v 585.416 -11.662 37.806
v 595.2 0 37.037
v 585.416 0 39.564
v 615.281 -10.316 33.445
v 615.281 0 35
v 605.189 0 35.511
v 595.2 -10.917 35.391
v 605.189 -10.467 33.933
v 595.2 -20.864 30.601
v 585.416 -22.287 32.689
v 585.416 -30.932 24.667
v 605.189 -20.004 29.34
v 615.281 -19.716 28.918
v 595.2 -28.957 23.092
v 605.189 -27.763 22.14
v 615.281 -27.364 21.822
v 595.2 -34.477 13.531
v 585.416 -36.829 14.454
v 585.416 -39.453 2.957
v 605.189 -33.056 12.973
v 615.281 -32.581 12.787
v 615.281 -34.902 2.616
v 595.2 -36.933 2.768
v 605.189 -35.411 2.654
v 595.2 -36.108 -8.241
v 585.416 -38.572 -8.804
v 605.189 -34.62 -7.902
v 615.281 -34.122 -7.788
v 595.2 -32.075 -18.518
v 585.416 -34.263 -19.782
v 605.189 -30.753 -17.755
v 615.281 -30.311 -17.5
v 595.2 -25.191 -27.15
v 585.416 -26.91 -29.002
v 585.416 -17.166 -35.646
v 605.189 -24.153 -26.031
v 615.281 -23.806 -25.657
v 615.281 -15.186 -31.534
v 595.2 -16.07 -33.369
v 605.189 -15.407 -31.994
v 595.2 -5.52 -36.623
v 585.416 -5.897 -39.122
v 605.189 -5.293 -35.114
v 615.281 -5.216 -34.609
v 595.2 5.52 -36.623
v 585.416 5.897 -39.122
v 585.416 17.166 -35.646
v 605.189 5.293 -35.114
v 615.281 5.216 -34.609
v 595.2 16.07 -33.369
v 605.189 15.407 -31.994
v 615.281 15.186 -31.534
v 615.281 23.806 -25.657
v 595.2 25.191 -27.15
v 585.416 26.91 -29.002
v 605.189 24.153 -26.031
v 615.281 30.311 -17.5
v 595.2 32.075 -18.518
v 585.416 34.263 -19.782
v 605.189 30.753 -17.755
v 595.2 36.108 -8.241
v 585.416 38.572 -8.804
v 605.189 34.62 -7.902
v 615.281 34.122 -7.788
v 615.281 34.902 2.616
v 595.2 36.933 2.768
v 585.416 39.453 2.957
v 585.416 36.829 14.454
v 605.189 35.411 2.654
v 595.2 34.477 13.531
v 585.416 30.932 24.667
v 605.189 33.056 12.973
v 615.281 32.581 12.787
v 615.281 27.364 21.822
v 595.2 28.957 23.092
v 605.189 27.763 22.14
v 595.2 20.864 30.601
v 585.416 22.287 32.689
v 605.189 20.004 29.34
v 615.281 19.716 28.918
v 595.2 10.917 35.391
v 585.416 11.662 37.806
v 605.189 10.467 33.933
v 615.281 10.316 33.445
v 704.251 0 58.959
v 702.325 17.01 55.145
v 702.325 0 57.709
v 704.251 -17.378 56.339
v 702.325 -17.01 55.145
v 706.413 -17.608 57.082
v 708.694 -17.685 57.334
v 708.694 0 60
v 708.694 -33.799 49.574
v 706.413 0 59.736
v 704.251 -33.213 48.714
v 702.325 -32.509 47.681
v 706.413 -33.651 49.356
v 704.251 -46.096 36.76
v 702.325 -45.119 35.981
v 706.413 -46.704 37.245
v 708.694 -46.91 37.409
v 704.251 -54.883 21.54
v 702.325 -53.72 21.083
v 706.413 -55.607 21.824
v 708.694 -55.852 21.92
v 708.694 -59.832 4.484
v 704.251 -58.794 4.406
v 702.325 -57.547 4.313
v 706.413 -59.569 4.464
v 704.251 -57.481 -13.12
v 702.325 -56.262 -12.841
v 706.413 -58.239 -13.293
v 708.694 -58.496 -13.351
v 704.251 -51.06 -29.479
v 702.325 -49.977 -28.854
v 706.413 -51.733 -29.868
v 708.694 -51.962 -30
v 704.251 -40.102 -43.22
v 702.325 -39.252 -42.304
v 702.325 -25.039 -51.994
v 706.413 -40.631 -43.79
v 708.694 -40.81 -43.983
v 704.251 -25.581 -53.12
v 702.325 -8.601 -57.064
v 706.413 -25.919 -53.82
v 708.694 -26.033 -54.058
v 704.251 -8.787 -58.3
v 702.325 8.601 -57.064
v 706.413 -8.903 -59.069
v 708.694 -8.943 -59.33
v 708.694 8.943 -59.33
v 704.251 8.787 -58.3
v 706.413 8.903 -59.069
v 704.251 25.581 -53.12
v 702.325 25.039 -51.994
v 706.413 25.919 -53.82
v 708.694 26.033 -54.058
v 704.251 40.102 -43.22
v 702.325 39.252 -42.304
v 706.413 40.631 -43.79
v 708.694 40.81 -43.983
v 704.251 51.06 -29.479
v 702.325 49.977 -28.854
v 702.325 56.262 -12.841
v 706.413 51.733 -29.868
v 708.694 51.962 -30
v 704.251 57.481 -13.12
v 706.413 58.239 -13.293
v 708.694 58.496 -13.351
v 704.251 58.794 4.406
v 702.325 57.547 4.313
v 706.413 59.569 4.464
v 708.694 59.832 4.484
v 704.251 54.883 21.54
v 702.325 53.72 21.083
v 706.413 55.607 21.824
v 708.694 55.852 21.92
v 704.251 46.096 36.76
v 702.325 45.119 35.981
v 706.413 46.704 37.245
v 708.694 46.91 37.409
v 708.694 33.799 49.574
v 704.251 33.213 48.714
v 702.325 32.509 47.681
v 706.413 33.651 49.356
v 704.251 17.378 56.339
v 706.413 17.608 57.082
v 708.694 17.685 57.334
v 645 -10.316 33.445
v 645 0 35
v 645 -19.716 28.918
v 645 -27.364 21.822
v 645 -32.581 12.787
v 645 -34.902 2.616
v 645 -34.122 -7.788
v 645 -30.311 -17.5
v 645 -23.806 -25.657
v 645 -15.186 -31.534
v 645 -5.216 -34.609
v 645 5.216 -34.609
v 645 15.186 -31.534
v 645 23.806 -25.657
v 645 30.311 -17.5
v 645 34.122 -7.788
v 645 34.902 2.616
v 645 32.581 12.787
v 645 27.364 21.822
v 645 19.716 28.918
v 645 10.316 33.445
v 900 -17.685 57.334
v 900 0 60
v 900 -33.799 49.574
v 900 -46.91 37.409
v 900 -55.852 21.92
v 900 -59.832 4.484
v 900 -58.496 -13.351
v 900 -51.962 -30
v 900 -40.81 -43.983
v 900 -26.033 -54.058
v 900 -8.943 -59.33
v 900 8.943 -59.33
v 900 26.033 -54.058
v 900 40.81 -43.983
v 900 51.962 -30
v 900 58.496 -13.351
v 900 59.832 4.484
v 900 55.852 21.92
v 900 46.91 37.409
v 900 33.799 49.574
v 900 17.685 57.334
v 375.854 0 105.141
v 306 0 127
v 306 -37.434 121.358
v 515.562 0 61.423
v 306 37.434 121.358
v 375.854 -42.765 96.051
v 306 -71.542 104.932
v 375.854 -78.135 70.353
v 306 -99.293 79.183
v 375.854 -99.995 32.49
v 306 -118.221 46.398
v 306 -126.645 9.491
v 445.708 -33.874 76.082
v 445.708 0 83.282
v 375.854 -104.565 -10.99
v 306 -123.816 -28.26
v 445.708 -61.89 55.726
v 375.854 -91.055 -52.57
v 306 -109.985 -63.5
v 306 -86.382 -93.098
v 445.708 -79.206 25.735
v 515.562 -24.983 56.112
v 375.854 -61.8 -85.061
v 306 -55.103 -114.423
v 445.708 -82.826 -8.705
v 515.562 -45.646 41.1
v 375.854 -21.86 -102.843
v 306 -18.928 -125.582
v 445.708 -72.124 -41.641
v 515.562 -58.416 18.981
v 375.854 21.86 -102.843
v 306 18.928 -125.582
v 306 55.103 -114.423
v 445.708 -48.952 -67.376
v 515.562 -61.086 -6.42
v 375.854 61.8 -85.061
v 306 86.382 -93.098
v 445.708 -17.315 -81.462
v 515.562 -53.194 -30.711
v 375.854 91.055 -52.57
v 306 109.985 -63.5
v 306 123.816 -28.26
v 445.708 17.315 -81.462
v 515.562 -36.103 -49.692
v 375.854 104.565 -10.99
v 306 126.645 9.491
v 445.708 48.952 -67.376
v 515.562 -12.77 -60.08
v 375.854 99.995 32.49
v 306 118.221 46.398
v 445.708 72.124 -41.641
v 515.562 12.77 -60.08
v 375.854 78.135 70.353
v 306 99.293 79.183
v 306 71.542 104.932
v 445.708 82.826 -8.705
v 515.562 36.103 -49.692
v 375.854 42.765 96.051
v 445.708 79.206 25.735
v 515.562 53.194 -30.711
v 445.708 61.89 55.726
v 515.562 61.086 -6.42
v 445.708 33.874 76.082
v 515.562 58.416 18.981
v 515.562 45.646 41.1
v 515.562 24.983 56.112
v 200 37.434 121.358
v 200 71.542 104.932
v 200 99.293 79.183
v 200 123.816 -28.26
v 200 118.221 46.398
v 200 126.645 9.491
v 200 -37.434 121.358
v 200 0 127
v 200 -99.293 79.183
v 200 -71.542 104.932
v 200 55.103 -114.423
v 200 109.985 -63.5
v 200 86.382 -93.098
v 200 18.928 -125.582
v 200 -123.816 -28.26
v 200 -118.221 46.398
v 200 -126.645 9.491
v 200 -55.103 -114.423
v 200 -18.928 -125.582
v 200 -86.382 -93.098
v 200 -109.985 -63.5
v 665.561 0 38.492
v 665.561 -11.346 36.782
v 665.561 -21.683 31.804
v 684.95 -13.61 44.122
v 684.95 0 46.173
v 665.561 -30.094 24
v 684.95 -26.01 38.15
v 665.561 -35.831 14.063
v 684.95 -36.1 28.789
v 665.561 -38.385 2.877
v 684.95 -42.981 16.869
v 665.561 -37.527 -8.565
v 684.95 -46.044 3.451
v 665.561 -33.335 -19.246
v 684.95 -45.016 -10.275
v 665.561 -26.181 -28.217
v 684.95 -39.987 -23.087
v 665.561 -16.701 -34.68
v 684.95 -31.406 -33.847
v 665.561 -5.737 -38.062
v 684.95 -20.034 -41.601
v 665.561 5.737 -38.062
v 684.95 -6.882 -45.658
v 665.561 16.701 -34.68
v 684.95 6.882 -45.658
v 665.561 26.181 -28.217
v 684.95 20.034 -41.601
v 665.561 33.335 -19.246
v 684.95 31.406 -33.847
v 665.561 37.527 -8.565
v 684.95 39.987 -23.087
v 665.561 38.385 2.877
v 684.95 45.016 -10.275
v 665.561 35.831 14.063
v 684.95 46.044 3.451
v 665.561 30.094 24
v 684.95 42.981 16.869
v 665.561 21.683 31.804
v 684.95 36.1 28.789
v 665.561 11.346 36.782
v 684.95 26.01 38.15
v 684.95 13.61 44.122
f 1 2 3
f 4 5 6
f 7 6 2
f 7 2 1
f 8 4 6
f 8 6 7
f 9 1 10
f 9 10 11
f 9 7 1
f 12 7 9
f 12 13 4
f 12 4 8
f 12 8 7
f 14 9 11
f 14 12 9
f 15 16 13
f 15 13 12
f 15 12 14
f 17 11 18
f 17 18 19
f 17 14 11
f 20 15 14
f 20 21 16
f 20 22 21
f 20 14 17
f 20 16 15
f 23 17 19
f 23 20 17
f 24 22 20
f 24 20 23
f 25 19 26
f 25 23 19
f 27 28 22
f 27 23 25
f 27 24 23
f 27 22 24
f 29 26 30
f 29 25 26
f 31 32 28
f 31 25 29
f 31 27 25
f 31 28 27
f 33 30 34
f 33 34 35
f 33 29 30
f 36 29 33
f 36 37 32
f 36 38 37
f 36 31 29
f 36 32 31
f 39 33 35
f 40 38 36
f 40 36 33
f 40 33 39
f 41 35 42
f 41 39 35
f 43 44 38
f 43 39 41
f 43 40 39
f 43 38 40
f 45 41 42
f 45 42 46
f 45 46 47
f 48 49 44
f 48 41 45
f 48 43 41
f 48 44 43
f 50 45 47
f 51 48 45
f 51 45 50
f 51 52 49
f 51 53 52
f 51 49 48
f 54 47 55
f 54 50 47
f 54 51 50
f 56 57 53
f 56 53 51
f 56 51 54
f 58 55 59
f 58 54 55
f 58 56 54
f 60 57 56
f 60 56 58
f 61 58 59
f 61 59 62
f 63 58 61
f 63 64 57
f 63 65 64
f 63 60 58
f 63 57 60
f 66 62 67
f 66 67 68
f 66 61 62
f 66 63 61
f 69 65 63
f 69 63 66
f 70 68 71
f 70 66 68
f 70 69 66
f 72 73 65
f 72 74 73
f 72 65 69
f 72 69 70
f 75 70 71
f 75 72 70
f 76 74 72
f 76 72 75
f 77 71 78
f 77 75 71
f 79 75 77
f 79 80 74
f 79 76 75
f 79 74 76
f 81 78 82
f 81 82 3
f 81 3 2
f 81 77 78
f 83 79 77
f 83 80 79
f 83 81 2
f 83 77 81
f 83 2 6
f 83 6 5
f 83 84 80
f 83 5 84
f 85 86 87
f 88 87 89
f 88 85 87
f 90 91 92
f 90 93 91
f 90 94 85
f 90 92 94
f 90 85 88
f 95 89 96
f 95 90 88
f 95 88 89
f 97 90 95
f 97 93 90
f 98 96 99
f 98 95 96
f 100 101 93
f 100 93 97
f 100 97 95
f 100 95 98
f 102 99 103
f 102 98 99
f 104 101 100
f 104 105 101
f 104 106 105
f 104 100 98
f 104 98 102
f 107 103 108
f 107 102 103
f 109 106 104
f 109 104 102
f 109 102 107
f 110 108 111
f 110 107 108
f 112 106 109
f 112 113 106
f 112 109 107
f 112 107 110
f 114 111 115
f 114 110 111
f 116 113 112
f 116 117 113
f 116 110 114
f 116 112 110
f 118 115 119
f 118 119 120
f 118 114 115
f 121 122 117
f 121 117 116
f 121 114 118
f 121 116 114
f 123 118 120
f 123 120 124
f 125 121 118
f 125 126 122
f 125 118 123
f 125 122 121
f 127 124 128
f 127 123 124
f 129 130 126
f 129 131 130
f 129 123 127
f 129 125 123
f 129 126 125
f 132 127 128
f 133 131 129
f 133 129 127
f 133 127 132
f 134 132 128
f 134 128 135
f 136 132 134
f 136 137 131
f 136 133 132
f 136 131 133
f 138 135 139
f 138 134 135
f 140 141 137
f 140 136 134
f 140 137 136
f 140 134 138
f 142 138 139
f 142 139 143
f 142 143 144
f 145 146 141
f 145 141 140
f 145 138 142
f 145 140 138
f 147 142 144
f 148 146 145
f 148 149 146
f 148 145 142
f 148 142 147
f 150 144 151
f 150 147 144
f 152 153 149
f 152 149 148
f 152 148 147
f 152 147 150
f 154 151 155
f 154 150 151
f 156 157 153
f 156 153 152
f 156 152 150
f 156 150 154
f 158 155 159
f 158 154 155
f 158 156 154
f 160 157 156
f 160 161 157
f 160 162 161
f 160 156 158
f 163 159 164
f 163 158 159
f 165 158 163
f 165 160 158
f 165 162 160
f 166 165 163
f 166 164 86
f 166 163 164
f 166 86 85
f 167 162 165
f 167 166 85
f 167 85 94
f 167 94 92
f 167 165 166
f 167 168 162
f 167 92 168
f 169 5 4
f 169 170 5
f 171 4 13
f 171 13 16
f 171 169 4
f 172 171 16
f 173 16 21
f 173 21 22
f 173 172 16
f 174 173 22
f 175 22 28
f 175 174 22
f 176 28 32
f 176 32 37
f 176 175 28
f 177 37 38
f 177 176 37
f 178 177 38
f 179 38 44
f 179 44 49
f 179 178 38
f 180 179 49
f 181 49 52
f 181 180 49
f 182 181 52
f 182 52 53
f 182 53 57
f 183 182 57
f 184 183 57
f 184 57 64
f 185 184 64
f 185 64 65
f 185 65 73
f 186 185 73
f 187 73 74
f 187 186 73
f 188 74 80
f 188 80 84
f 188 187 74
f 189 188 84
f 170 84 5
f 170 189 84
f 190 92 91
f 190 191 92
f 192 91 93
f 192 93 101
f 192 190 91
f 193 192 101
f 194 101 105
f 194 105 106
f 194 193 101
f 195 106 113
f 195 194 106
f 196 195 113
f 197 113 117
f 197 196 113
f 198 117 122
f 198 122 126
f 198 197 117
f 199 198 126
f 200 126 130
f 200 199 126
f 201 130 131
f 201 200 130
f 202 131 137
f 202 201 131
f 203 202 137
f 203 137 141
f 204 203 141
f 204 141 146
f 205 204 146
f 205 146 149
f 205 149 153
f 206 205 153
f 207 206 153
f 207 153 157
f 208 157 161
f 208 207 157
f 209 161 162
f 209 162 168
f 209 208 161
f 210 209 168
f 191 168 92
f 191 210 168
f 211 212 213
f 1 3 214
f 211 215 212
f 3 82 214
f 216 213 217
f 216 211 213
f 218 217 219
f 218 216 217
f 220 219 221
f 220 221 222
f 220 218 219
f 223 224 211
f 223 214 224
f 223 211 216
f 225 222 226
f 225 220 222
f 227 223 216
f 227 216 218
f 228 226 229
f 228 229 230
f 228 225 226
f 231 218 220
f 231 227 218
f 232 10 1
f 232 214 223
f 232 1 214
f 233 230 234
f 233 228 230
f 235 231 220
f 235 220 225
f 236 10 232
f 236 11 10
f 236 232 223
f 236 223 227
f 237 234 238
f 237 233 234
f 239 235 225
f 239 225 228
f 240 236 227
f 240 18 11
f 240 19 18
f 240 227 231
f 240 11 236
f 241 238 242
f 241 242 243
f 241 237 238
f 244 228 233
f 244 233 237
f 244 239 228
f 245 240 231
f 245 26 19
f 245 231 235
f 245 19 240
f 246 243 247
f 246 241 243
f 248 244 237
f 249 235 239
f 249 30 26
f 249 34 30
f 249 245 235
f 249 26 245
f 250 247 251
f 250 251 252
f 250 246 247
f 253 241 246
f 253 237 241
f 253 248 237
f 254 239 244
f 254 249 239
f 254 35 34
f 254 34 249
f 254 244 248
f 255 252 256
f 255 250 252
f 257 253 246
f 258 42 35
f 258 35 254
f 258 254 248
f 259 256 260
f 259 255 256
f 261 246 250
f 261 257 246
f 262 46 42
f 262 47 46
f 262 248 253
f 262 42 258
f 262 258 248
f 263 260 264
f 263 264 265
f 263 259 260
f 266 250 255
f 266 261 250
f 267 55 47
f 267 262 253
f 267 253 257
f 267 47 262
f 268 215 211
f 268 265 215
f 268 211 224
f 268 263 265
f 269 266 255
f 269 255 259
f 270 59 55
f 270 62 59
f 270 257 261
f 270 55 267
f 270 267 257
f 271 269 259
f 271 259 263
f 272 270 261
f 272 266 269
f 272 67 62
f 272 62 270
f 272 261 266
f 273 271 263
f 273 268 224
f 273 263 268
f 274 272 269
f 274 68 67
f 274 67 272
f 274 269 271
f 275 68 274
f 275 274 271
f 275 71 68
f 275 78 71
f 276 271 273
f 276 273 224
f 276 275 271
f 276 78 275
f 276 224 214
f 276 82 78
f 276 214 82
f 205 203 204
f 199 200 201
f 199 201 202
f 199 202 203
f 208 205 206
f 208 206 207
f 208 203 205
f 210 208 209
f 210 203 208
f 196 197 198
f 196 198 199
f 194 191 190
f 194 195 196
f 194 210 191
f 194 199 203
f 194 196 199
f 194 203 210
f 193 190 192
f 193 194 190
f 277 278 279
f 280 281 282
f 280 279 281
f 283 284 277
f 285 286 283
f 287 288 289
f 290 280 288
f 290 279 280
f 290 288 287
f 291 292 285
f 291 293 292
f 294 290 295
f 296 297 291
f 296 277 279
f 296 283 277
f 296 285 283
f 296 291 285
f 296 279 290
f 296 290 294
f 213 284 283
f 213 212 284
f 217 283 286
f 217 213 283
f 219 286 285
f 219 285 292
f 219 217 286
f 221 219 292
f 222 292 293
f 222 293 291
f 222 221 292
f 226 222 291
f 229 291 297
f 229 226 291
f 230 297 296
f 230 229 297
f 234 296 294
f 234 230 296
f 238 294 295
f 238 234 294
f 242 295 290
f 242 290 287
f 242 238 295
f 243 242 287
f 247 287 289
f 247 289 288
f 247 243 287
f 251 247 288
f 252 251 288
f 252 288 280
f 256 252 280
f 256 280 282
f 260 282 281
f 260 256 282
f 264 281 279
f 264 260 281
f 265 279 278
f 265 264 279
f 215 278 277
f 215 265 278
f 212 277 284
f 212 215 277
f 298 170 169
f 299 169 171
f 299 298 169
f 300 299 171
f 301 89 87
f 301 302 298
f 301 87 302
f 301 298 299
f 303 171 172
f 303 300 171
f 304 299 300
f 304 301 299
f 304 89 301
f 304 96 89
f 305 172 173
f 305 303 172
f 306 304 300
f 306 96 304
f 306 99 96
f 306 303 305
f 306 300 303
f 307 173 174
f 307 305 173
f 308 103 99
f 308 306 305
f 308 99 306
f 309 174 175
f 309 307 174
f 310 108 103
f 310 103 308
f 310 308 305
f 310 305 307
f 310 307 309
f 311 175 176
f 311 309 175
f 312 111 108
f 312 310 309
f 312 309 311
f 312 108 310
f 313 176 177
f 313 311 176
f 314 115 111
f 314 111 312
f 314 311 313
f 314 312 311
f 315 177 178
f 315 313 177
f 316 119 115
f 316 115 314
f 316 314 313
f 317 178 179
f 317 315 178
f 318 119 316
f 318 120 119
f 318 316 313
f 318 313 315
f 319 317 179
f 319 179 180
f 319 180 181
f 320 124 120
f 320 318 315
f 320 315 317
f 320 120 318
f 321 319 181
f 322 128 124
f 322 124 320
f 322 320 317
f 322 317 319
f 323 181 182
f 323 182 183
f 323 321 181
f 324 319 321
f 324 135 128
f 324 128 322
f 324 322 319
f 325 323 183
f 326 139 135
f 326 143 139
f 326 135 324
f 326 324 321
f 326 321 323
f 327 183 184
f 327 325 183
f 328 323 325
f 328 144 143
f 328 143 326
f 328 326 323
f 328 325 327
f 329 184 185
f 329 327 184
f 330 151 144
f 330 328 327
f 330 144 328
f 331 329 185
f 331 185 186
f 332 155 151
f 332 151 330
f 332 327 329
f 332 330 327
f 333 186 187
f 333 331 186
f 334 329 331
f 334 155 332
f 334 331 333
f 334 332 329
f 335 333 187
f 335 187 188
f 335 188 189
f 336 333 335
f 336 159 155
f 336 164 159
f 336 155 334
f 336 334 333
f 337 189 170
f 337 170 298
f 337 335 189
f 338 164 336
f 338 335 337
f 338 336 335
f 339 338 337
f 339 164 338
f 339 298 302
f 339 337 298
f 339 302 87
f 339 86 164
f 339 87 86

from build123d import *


with BuildPart() as part:
    # Sketch1 → Revolve1 (revolve)
    with BuildSketch(Plane(origin=(0, 0, 0), x_dir=(1, 0, 0), z_dir=(0, 1, 0)), mode=Mode.PRIVATE) as revolve1_sk:
        with BuildLine():
            Line((200, 0), (200, 127))
            Line((200, 127), (306, 127))
            Line((306, 127), (585.416444947, 39.563561445))
            ThreePointArc((585.416444947, 39.563561445), (600.17534443, 36.147473842), (615.280908712, 35))
            Line((615.280908712, 35), (645, 35))
            ThreePointArc((645, 35), (675.456211488, 41.825909834), (702.324557443, 57.708788945))
            ThreePointArc((702.324557443, 57.708788945), (705.309695294, 59.409779207), (708.694374787, 60))
            Line((708.694374787, 60), (900, 60))
            Line((900, 60), (900, 0))
            Line((900, 0), (200, 0))
        make_face()
    revolve(revolve1_sk.sketch.rotate(Axis((0, 0, 0), (1, 0, 0)), 180), axis=Axis((0, 0, 0), (1, 0, 0)))


solid = part.part
